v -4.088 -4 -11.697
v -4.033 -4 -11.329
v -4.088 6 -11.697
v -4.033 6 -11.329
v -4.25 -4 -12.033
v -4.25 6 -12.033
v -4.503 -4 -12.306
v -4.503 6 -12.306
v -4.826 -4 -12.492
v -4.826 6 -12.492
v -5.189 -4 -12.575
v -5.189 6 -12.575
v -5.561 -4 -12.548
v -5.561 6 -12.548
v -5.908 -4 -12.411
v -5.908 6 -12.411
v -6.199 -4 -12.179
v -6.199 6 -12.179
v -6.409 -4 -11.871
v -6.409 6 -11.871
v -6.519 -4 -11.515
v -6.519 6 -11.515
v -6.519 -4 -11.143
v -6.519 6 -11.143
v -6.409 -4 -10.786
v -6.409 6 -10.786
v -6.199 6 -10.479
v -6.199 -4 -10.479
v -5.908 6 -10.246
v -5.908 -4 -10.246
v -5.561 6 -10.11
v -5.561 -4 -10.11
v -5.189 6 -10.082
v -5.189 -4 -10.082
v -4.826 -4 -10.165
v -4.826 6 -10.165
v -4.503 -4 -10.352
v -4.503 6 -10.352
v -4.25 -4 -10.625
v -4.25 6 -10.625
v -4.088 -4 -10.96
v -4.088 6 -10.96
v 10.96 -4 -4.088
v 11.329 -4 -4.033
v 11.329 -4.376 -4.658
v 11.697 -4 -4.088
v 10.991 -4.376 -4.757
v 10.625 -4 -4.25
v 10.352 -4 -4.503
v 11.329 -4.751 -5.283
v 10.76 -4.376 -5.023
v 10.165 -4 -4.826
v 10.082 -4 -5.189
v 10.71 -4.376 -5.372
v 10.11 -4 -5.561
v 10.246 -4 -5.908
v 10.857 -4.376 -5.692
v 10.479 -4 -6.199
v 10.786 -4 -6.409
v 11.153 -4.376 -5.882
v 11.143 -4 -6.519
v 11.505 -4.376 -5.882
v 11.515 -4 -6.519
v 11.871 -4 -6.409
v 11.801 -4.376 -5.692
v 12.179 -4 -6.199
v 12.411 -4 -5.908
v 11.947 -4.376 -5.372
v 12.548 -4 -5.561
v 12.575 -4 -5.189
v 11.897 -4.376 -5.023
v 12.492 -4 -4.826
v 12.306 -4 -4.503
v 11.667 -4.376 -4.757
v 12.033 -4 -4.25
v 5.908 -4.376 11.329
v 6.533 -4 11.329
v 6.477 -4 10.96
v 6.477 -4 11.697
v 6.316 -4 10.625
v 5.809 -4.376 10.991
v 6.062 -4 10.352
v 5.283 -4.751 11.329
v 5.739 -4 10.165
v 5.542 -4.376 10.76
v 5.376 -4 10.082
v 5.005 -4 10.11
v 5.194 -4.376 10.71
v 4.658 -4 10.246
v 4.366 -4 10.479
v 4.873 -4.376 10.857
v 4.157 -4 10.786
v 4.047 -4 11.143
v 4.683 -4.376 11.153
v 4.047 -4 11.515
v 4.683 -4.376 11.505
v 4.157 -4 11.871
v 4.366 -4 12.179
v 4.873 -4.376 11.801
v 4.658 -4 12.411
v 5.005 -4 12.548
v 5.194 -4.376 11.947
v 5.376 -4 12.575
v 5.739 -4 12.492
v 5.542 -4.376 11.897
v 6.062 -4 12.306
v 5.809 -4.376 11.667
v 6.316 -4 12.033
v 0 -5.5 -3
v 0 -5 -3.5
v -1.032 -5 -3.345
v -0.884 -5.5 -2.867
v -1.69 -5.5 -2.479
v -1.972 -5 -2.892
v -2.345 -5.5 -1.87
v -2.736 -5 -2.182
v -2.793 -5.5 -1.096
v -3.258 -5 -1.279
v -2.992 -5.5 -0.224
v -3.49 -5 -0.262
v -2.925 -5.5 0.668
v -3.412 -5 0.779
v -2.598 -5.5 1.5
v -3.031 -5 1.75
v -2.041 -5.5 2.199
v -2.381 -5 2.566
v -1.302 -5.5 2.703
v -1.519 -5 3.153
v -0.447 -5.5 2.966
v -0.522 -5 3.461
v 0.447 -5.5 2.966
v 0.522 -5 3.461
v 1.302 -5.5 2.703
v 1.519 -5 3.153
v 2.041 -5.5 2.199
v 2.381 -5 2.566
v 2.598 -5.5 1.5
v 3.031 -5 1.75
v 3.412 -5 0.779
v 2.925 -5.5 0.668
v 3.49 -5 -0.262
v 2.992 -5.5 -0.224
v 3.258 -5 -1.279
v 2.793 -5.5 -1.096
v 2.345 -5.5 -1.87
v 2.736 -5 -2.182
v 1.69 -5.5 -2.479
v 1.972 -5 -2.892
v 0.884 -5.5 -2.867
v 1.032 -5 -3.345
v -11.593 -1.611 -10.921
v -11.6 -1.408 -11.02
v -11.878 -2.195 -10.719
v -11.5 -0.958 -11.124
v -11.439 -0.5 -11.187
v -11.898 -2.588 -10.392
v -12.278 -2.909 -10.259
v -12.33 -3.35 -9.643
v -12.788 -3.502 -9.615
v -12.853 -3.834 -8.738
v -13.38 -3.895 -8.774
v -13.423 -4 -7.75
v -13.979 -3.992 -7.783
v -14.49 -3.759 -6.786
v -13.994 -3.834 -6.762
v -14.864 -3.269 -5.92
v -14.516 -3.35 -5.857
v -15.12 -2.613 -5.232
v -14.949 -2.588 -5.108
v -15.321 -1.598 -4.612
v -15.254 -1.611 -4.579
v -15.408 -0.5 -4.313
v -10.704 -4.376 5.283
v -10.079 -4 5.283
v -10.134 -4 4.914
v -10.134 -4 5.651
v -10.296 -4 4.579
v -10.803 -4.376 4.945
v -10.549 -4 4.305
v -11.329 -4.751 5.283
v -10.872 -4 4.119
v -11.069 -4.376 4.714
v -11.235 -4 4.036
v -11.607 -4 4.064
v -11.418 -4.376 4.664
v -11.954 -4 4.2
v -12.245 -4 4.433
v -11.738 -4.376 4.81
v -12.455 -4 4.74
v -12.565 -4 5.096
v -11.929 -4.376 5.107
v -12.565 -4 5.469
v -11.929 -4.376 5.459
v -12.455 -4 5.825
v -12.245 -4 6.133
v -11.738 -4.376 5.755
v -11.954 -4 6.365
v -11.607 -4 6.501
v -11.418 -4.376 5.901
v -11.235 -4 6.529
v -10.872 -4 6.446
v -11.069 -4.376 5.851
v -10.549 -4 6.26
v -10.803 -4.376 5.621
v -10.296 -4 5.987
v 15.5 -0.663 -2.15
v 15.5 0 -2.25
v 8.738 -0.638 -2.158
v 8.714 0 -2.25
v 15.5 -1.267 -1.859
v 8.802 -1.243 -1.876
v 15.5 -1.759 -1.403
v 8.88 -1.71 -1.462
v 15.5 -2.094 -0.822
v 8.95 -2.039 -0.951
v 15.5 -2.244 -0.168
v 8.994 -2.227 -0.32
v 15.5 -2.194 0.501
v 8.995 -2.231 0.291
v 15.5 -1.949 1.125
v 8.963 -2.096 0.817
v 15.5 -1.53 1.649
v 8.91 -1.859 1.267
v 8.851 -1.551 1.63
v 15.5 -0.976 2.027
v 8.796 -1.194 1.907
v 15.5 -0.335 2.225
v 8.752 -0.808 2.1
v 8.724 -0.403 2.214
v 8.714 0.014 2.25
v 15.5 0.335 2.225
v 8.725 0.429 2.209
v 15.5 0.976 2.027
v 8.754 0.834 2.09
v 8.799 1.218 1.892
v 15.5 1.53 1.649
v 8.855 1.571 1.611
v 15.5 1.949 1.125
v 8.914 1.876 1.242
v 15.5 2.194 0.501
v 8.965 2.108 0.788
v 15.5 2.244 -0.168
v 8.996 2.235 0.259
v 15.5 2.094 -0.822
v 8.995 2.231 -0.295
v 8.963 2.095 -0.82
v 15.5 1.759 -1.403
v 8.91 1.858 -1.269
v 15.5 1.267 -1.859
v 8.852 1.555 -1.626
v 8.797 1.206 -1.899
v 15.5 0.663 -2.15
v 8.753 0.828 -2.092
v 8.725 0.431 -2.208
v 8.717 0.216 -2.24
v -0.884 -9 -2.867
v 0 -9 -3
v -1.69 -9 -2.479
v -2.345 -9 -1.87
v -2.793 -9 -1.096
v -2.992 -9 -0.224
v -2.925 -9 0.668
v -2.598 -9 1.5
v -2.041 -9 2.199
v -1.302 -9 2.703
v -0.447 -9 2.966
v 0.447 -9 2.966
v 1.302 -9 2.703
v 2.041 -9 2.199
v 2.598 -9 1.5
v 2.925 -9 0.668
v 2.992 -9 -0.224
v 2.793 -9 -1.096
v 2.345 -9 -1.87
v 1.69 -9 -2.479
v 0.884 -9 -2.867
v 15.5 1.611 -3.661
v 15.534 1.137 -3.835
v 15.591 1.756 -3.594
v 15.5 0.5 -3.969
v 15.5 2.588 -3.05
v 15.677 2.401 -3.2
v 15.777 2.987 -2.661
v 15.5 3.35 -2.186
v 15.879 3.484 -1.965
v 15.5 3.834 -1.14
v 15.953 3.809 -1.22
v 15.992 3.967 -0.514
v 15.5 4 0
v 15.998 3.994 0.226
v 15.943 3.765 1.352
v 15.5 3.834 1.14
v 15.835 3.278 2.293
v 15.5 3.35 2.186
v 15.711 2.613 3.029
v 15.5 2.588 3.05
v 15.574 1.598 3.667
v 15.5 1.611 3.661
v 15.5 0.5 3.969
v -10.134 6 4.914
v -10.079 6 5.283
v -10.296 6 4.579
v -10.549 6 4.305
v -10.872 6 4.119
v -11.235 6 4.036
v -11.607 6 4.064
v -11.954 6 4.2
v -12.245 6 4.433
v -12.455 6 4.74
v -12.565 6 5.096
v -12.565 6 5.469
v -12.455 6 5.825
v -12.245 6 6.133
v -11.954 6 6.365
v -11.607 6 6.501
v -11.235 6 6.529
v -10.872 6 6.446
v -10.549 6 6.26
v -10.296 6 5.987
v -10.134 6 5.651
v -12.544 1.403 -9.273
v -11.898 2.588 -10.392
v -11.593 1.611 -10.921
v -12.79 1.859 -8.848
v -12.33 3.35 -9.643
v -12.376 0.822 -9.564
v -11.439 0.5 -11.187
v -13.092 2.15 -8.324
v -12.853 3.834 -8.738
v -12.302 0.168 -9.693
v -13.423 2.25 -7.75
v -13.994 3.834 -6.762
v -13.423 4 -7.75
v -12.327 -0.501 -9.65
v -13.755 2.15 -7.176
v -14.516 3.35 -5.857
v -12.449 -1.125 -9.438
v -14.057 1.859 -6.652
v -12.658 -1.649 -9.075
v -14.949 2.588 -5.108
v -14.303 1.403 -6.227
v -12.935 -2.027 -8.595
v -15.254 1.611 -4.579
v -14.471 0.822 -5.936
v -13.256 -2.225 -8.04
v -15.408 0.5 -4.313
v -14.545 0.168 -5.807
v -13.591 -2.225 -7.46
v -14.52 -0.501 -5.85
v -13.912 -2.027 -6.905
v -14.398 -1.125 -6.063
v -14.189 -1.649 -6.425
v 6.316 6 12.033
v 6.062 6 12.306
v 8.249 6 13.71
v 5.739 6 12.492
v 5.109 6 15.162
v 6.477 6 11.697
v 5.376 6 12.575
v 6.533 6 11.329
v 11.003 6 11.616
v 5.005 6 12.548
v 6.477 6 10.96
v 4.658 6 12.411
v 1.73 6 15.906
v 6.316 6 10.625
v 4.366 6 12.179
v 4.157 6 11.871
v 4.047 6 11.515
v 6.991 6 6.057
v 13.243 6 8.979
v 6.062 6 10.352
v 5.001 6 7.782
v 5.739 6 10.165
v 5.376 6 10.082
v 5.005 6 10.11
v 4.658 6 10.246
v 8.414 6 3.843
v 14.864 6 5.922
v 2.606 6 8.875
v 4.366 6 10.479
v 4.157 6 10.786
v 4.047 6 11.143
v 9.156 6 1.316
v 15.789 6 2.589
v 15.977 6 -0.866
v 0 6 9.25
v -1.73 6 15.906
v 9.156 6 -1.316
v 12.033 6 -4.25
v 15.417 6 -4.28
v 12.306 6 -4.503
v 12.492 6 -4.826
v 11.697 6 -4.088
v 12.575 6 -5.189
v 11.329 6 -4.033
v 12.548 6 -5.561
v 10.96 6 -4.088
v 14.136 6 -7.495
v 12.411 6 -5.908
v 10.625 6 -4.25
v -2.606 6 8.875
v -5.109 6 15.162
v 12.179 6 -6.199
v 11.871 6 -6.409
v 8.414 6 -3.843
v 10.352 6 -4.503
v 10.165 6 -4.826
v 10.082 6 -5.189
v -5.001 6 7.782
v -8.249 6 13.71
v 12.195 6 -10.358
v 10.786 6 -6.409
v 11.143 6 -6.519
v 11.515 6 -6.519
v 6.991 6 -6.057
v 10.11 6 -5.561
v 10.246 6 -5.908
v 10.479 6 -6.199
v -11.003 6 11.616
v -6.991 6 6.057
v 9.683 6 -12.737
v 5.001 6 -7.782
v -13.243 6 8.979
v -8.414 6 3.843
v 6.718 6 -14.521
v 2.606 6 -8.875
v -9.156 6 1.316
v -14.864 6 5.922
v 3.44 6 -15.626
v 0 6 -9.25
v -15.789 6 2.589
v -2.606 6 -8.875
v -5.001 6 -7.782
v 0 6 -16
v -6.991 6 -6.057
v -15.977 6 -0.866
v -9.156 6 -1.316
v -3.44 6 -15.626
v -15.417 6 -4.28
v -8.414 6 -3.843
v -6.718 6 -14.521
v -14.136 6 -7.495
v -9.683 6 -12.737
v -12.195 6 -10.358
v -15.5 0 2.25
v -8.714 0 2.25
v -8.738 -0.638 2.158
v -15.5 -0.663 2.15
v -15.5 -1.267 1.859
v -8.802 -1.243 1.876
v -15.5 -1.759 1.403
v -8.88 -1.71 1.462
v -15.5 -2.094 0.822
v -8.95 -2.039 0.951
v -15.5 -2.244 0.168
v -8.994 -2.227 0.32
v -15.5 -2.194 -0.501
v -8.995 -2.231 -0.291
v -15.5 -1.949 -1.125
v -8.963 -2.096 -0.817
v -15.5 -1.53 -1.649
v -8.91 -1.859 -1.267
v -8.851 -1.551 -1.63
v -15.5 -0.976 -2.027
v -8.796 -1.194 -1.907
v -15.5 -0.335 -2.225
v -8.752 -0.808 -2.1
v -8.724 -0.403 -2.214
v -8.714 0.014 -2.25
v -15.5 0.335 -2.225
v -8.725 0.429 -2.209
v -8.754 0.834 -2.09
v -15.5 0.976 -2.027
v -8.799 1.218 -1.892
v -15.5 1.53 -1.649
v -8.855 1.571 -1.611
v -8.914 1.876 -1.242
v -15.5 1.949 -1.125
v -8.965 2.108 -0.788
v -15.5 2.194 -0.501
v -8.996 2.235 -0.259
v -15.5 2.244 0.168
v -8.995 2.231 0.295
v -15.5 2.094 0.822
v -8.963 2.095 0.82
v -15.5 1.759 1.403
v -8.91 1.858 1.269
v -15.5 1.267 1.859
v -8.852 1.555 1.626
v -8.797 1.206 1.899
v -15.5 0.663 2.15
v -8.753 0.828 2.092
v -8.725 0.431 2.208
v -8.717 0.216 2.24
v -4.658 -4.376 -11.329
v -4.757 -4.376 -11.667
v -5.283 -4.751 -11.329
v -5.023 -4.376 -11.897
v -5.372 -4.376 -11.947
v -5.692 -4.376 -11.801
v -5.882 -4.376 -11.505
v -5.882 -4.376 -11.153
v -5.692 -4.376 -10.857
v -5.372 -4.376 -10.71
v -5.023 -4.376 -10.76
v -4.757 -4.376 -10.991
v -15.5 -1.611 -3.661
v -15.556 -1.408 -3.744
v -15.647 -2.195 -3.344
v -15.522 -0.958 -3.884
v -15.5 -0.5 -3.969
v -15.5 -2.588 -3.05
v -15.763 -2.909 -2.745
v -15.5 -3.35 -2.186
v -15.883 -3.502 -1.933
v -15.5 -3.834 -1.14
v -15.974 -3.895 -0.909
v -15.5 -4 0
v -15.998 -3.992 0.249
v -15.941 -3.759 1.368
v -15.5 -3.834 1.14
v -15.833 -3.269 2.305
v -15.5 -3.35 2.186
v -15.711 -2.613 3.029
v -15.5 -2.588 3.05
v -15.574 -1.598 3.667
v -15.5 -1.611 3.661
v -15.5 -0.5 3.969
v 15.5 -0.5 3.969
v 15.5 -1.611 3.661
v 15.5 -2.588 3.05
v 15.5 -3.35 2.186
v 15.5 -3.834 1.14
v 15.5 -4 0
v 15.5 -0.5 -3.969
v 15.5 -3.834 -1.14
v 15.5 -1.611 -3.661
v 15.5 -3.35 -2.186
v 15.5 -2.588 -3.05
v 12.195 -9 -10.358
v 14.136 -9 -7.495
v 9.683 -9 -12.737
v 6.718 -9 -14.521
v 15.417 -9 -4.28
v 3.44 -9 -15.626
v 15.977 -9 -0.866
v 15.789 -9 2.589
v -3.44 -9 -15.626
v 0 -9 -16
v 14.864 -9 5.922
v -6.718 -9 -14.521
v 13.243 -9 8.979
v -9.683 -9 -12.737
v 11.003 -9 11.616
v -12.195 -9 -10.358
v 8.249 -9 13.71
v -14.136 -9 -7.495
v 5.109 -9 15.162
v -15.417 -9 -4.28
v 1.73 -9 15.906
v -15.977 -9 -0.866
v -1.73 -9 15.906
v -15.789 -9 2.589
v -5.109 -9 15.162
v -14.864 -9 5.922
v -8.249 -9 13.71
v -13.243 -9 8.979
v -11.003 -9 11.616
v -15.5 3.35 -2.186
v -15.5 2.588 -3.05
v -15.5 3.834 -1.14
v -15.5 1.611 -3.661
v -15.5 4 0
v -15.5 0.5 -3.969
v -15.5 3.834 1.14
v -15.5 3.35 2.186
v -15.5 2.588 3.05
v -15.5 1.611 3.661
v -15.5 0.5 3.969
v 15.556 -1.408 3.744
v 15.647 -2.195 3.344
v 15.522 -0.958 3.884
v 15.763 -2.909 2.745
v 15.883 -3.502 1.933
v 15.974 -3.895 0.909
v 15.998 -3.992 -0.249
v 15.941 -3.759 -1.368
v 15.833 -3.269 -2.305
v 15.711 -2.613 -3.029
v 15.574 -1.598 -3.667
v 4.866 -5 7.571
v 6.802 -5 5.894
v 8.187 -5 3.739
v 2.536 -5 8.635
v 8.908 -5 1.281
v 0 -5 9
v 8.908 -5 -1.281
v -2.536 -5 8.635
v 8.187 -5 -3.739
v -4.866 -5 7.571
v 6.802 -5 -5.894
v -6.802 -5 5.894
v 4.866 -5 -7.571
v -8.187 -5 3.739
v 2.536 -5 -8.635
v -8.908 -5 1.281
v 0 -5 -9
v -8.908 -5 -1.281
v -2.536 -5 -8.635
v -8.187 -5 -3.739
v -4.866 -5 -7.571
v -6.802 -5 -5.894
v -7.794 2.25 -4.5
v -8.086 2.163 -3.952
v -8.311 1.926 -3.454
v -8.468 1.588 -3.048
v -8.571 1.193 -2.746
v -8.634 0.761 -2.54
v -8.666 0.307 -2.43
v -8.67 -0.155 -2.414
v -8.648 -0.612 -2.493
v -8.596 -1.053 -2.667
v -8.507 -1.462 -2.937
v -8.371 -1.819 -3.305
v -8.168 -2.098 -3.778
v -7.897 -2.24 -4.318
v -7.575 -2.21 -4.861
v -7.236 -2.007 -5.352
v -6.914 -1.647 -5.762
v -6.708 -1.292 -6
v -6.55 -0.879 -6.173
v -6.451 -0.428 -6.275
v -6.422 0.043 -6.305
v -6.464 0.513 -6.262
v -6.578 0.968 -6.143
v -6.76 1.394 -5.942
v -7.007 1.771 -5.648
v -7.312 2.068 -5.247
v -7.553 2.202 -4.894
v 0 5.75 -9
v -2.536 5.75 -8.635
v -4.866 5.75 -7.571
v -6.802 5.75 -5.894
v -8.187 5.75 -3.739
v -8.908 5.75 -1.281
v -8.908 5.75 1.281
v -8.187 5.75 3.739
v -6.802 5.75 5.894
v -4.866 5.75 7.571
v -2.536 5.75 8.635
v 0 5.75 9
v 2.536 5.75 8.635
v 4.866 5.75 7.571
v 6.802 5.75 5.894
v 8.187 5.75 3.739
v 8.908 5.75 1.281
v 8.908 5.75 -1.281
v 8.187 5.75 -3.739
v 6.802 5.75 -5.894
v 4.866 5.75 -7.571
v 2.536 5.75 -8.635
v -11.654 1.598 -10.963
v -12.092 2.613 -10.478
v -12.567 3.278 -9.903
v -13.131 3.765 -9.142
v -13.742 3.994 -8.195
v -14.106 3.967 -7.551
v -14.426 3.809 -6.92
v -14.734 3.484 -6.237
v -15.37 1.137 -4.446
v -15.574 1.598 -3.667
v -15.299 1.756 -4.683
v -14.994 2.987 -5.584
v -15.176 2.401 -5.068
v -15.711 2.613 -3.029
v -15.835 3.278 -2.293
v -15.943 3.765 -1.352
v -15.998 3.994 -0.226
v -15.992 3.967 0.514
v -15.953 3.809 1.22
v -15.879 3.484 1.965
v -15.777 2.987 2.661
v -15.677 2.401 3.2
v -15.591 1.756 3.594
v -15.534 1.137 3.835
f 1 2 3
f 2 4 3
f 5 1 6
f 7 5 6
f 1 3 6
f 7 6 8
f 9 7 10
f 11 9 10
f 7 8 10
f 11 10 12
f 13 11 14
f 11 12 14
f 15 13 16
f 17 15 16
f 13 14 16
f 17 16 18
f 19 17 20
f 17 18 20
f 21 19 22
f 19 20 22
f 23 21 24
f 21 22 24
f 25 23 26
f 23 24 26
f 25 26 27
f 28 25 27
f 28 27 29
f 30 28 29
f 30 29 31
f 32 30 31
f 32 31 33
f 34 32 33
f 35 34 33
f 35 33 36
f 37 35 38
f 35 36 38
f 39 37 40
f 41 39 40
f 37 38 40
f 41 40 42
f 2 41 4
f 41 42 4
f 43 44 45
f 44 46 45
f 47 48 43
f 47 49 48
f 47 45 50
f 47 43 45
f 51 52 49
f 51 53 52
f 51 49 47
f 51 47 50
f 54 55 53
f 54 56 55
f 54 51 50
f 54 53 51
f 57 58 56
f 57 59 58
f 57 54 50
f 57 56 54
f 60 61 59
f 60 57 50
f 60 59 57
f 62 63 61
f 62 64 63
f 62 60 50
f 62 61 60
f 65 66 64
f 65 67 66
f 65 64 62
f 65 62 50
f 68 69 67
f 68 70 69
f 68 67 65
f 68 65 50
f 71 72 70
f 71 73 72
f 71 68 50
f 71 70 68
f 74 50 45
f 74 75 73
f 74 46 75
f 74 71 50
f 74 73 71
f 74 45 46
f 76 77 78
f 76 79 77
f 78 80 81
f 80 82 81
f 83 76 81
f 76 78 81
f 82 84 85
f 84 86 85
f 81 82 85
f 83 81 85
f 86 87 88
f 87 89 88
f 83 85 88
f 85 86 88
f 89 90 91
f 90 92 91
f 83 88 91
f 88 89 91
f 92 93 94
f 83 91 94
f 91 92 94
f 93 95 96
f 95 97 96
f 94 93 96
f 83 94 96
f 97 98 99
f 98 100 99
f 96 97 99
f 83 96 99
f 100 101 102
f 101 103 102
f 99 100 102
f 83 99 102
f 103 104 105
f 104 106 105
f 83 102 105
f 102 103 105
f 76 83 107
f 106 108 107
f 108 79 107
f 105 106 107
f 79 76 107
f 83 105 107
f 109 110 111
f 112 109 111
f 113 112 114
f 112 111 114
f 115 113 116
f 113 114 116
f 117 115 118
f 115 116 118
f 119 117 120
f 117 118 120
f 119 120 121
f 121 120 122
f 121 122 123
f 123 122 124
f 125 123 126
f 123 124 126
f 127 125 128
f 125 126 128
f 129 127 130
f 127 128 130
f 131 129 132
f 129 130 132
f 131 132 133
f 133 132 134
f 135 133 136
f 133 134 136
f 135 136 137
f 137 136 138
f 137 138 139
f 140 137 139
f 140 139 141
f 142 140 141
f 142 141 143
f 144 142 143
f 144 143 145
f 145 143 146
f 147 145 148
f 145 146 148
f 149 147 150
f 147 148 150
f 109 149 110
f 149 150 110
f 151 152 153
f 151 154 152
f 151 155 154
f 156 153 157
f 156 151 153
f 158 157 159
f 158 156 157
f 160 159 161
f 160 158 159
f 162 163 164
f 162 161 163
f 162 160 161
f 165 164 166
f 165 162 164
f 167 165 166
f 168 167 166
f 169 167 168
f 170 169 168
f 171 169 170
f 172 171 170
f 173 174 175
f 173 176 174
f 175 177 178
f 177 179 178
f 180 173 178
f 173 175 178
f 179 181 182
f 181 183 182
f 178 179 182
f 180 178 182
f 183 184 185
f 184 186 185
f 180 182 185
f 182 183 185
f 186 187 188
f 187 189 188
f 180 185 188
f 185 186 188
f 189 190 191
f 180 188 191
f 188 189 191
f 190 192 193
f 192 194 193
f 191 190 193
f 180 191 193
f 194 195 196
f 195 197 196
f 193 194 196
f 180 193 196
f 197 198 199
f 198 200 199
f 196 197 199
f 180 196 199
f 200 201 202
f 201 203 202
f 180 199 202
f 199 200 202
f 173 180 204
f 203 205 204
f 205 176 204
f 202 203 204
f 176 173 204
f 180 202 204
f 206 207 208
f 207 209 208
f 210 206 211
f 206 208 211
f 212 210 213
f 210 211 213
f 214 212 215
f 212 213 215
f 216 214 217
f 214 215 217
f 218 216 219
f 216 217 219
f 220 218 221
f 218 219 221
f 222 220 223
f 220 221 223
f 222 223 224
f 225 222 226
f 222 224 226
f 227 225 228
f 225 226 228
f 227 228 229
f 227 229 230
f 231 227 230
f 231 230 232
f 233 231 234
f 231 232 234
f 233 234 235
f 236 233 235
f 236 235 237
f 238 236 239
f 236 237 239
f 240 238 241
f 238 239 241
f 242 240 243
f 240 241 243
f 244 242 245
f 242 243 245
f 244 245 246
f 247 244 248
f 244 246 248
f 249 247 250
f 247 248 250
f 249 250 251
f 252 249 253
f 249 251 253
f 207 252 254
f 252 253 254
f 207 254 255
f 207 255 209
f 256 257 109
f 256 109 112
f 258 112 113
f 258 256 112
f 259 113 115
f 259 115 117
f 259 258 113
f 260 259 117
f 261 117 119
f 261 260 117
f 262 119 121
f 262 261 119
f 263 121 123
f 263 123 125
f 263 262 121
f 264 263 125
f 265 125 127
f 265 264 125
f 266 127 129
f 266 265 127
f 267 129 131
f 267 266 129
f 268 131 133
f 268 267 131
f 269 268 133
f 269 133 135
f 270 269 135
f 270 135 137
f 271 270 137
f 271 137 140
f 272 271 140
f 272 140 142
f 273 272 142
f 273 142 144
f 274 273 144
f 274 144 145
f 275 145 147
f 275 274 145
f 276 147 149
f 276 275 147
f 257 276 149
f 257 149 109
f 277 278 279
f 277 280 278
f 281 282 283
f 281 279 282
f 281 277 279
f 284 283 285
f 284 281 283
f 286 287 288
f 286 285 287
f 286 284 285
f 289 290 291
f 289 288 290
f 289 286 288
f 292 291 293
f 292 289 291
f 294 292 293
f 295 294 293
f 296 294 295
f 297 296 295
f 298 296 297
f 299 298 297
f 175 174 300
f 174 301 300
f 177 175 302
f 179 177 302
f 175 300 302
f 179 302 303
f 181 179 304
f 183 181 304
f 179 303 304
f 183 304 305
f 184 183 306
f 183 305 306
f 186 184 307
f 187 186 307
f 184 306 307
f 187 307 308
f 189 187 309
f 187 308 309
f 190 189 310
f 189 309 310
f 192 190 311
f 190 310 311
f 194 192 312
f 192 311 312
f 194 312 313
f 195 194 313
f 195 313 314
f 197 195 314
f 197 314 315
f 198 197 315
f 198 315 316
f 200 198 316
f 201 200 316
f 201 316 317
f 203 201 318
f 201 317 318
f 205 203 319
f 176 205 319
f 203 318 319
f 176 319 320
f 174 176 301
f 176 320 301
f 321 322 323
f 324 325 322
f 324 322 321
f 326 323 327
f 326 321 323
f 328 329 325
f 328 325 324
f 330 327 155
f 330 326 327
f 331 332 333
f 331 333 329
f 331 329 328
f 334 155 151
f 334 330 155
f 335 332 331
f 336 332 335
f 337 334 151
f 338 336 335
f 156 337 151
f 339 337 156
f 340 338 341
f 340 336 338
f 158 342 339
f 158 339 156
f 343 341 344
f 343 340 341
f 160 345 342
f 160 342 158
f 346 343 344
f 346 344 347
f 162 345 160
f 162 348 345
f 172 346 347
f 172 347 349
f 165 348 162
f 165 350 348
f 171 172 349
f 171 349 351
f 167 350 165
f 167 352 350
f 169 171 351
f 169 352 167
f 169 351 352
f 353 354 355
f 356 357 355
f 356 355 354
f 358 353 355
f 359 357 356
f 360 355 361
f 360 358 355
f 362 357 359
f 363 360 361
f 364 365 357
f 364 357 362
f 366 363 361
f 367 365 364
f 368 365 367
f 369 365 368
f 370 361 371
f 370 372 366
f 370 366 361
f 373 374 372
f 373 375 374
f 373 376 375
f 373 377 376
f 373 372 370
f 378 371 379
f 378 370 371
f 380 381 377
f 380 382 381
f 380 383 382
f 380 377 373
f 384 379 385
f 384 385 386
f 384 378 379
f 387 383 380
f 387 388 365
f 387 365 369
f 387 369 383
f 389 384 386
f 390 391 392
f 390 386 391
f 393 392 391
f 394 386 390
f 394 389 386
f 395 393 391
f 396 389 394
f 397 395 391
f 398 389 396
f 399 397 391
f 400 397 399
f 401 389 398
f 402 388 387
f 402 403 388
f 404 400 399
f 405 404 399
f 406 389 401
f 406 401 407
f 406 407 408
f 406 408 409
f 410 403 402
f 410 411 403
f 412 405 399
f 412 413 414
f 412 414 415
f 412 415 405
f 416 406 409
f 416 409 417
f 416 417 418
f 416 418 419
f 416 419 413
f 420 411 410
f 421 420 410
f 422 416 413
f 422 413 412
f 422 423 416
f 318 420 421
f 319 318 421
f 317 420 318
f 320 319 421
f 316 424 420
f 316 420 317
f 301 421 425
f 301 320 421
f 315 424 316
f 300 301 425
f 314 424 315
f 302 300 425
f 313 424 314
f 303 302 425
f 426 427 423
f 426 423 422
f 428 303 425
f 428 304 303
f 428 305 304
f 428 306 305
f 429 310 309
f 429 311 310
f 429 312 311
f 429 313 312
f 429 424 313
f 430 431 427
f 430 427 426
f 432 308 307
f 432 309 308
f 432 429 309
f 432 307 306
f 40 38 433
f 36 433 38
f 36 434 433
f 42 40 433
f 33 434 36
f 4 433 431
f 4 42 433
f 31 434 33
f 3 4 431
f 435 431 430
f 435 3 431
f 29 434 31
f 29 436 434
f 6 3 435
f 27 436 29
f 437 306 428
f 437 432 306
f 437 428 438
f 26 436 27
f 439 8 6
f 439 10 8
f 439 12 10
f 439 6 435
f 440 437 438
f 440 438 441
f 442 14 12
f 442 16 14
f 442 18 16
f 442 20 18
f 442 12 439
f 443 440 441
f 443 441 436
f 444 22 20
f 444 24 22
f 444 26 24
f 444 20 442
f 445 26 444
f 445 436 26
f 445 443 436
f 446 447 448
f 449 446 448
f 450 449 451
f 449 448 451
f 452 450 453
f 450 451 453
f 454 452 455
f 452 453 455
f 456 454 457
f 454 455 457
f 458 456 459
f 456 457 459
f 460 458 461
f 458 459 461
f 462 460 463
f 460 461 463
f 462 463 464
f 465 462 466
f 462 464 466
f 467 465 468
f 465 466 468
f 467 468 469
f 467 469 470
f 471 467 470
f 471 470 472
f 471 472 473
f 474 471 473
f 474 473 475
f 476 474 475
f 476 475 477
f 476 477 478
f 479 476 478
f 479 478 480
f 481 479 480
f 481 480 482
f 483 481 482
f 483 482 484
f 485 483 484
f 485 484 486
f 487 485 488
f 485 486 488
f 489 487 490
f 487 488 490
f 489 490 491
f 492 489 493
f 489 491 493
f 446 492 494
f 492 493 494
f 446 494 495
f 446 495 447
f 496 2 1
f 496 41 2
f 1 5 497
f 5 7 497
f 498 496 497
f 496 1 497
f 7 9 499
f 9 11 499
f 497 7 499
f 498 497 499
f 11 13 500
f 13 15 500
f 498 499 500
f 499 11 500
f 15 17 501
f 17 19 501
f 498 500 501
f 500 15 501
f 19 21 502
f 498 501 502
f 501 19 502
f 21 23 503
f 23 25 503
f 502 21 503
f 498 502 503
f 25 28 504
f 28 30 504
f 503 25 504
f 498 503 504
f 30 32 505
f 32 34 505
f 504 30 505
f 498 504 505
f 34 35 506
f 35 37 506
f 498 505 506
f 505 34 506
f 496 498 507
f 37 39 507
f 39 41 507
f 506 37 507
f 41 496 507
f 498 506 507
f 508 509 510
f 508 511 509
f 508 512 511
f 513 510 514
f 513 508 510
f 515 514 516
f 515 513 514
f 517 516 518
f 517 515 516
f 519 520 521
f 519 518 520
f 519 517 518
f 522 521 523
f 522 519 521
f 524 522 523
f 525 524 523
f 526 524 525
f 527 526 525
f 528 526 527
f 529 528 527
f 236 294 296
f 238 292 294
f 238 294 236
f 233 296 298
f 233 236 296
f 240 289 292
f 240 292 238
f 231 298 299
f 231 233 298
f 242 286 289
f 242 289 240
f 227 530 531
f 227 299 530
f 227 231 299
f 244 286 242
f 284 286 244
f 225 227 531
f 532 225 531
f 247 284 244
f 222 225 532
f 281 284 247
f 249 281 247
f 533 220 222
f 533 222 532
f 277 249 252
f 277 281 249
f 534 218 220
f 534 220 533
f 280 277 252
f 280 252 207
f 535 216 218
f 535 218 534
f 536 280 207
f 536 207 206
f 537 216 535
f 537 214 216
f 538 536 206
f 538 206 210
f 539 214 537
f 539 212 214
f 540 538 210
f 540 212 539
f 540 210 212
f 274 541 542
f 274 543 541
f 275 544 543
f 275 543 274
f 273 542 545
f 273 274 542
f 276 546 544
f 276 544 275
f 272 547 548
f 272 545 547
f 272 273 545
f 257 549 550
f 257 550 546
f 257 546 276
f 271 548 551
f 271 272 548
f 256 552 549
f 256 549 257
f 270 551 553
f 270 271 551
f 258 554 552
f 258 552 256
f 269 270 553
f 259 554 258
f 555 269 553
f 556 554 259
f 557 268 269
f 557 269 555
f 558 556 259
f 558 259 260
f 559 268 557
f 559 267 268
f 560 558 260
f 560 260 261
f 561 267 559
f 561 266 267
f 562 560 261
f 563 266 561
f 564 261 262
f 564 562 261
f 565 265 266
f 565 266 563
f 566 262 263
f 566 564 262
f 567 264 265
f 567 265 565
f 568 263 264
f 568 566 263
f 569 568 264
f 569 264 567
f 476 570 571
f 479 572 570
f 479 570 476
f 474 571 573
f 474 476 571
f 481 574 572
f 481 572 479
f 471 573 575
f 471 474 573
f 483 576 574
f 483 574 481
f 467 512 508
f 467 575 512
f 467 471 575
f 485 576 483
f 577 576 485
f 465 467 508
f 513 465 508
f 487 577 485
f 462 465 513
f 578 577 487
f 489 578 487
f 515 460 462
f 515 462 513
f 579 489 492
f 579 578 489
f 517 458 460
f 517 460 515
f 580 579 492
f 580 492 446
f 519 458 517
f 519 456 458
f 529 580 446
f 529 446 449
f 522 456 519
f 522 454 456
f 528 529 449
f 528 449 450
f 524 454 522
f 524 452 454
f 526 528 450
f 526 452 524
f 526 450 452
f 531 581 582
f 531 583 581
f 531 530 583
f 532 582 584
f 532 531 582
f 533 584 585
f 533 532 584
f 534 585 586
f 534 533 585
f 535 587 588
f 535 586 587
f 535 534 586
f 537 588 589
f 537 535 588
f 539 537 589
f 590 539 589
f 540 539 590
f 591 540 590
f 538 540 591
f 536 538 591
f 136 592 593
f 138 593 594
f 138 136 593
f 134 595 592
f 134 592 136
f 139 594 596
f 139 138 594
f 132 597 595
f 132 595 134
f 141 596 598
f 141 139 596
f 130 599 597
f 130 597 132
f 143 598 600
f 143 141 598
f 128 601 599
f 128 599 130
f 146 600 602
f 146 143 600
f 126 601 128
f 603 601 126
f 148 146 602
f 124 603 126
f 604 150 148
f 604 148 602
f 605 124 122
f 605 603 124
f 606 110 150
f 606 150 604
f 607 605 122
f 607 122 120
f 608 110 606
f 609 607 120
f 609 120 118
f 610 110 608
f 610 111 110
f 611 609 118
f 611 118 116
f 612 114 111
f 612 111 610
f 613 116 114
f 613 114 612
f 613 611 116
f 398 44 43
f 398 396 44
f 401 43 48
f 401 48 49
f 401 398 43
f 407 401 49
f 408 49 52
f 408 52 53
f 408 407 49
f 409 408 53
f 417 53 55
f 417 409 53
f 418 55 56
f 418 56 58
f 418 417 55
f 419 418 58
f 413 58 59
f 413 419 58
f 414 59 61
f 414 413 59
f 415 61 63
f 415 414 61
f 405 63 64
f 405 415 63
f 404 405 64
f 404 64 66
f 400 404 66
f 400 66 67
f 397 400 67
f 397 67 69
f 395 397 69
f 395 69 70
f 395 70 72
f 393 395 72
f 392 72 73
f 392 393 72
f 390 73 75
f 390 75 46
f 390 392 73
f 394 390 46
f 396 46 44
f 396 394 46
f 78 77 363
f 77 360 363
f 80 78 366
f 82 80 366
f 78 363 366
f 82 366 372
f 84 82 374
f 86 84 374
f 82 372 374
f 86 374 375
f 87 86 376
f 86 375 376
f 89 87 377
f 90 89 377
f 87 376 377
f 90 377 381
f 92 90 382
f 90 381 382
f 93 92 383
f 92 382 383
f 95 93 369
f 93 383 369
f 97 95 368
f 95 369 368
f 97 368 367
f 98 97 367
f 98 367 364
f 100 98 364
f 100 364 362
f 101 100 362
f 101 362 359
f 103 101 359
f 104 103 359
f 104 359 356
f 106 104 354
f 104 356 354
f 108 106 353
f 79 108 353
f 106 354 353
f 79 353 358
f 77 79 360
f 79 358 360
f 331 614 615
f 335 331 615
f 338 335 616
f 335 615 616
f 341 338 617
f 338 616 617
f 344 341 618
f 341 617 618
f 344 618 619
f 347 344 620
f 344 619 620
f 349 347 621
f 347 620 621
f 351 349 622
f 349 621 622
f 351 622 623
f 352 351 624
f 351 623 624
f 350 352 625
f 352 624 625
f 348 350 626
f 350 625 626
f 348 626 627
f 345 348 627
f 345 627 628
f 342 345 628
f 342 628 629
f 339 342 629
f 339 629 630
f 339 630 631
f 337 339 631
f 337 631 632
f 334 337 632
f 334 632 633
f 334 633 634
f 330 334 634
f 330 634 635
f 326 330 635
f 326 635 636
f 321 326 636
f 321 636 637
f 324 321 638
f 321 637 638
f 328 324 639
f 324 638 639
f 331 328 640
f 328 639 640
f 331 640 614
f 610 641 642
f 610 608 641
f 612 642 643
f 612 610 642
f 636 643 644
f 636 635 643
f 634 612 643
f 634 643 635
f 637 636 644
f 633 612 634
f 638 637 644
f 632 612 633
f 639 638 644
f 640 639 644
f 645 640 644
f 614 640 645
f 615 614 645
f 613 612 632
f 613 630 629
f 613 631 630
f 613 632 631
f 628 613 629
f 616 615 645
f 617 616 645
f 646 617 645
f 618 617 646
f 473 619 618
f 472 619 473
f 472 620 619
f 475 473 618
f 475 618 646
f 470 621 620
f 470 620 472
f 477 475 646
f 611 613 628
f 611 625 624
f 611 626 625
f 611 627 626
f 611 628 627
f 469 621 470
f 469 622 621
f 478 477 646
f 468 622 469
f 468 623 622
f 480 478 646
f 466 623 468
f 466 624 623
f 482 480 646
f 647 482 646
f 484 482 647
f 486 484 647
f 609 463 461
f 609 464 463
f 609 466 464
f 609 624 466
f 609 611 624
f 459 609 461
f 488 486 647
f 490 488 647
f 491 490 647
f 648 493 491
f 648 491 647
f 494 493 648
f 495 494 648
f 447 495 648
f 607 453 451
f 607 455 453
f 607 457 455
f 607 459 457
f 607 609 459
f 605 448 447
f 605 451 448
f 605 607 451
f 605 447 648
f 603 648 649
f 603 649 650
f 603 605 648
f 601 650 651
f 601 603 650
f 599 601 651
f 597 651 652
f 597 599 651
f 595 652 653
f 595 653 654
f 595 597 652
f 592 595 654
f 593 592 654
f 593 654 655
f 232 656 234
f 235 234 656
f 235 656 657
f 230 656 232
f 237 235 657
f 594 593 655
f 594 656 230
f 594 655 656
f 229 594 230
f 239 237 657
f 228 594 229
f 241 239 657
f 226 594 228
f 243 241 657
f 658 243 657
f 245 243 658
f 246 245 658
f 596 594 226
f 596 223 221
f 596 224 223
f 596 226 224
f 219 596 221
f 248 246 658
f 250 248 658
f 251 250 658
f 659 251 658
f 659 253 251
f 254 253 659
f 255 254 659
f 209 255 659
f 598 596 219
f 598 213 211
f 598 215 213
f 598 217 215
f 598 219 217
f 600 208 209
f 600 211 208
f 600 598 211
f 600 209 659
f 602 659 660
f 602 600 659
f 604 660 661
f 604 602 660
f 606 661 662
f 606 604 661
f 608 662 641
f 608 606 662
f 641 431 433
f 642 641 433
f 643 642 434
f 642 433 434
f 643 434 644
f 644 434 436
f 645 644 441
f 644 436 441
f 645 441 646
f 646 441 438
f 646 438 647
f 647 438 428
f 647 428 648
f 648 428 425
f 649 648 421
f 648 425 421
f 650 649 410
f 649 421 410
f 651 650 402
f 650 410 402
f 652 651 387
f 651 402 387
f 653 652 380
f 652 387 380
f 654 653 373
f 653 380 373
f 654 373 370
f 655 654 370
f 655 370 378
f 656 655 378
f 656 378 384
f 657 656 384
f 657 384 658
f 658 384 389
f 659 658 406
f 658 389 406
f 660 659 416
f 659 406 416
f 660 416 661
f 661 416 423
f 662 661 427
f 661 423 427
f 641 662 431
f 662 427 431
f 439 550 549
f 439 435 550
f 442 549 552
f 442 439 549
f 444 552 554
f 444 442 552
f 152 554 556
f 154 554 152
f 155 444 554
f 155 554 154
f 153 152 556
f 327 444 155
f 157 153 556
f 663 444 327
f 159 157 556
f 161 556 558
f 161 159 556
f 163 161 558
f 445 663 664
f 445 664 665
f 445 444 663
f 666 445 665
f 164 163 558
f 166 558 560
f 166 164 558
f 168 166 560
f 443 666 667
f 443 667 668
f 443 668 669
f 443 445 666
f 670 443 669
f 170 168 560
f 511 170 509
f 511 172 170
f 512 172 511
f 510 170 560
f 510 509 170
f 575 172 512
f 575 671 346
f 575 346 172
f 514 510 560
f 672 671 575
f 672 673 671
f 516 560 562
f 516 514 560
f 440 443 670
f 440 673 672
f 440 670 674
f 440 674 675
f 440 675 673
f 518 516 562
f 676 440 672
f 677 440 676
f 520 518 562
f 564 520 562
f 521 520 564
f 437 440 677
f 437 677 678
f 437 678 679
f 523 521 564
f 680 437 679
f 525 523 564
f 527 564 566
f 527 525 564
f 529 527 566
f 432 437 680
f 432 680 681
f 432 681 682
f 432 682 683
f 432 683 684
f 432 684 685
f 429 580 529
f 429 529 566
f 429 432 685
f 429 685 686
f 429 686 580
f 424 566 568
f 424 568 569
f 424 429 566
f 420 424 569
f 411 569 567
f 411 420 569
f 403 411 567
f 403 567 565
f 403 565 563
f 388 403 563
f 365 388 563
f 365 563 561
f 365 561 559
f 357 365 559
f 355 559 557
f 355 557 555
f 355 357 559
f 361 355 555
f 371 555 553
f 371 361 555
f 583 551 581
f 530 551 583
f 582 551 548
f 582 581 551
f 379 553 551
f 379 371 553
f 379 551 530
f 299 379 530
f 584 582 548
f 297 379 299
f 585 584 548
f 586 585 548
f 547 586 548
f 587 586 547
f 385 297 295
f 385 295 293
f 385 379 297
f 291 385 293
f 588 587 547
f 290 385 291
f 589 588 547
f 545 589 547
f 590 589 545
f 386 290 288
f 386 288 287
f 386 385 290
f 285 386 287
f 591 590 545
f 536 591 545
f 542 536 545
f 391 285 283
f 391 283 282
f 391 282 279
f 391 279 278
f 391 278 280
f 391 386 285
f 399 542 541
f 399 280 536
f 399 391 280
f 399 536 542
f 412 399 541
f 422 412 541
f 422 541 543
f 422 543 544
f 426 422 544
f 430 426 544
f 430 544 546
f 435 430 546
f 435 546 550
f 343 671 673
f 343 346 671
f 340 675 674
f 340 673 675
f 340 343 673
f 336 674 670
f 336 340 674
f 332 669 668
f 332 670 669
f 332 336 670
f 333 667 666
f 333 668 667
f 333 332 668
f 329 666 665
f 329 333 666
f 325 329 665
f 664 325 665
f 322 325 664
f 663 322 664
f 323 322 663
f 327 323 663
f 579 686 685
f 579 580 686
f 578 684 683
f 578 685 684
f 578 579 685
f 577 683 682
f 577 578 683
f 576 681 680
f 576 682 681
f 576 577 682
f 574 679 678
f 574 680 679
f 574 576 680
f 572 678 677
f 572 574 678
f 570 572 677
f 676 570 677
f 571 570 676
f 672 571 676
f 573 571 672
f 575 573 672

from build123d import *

# Parameters (mm, degrees)
ESBO_O4_W                        = 2.25
ESBO_O4_H                        = 16
F_4_5_4_5_DIAMETER_HOLE2_D       = 4.5
F_4_5_4_5_DIAMETER_HOLE2_DEPTH   = 18
F_4_5_4_5_DIAMETER_HOLE2_TIP     = 1.351936393
ESBO_O12_R                       = 16
ESBO_O12_R_2                     = 9
RESSALTO_EXTRUS_O1_DEPTH         = 1
CHANFRO1_SIZE                    = 0.5
CHANFRO2_SIZE                    = 0.25
FURO_DE_DI_METRO_4_5_4_5_2_D     = 4.5
FURO_DE_DI_METRO_4_5_4_5_2_DEPTH = 8
FURO_DE_DI_METRO_4_5_4_5_2_TIP   = 1.351936393
CORTE_EXTRUS_O4_START            = -0.5
ESBO_O18_R                       = 4
ESBO_O18_R_2                     = 2.25
CORTE_EXTRUS_O4_DEPTH            = 0.5
PADR_OCIRCULAR6_COUNT            = 2
PADR_OCIRCULAR6_ANGLE            = 30
PADR_OCIRCULAR7_COUNT            = 2
PADR_OCIRCULAR7_ANGLE            = 210


# Read off the part's stored shape, not the designer's step: PadrãoCircular5
with BuildPart() as part:
    # Esboço1 → Revolução1 (revolve)
    with BuildSketch(Plane.XY, mode=Mode.PRIVATE) as revolu_o1_sk:
        Polygon((3, -9), (16, -9), (16, 5), (9, 5), (9, -5), (3, -5), align=None)
    revolve(revolu_o1_sk.sketch.rotate(Axis((0, -9, 0), (0, 1, 0)), 90), axis=Axis((0, -9, 0), (0, 1, 0)))

    # Esboço4 → Furo de diâmetro Ø4.5 (4.5)1 (revolve, cut)
    with BuildSketch(Plane(origin=(16, 0, 0), x_dir=(0, 0, -1), z_dir=(0, 1, 0))):
        with Locations((1.125, 8)):
            Rectangle(ESBO_O4_W, ESBO_O4_H)
    revolve(axis=Axis((22.35, 0, 0), (-1, 0, 0)), mode=Mode.SUBTRACT)

    # Ø4.5 (4.5) Diameter Hole2
    with Locations(Plane(origin=(-13.856406461, 0, -8), x_dir=(0, -1, 0), z_dir=(-0.8660254037844364, 0, -0.5000000000000041))):
        with Locations((0, 0)):
            Hole(F_4_5_4_5_DIAMETER_HOLE2_D / 2, depth=F_4_5_4_5_DIAMETER_HOLE2_DEPTH)
            with Locations((0, 0, -(F_4_5_4_5_DIAMETER_HOLE2_DEPTH + F_4_5_4_5_DIAMETER_HOLE2_TIP / 2))):  # 118° drill point
                Cone(0, F_4_5_4_5_DIAMETER_HOLE2_D / 2, F_4_5_4_5_DIAMETER_HOLE2_TIP, mode=Mode.SUBTRACT)

    # Esboço12 → Ressalto-extrusão1 (add)
    with BuildSketch(Plane(origin=(0, 5, 0), x_dir=(1, 0, 0), z_dir=(0, 1, 0))):
        with Locations(Location((0, 0, 0), (0, 0, 90))):
            Circle(ESBO_O12_R)
        with Locations(Location((0, 0, 0), (0, 0, 90))):
            Circle(ESBO_O12_R_2, mode=Mode.SUBTRACT)
    extrude(amount=RESSALTO_EXTRUS_O1_DEPTH)

    # Esboço13 → Furo roscado de M3x0.51 (revolve, cut)
    with BuildSketch(Plane(origin=(11.328847338, 6, -5.282728272), x_dir=(0, 0, 1), z_dir=(1, 0, 0))):
        Polygon((0, 0), (0, 10.751075774), (1.25, 10), (1.25, 0), align=None)
    revolve(axis=Axis((11.328847338, 12.35, -5.282728272), (0, -1, 0)), mode=Mode.SUBTRACT)

    # PadrãoCircular5 outline → PadrãoCircular5 (revolve, cut)
    with BuildSketch(Plane(origin=(5.282728272, 0, 11.328847338), x_dir=(1, 0, 0), z_dir=(0, 0, 1))):
        Polygon((0, 6), (0, -4.751075774), (1.25, -4), (1.25, 6), align=None)
    revolve(axis=Axis((5.282728272, 0, 11.328847338), (0, 1, 0)), mode=Mode.SUBTRACT)

    # Padr_oCircular5 2 outline → Padr_oCircular5 2 (revolve, cut)
    with BuildSketch(Plane(origin=(-11.328847338, 0, 5.282728272), x_dir=(1, 0, 0), z_dir=(0, 0, 1))):
        Polygon((0, 6), (0, -4.751075774), (1.25, -4), (1.25, 6), align=None)
    revolve(axis=Axis((-11.328847338, 0, 5.282728272), (0, 1, 0)), mode=Mode.SUBTRACT)

    # Padr_oCircular5 3 outline → Padr_oCircular5 3 (revolve, cut)
    with BuildSketch(Plane(origin=(-5.282728272, 0, -11.328847338), x_dir=(1, 0, 0), z_dir=(0, 0, 1))):
        Polygon((0, 6), (0, -4.751075774), (1.25, -4), (1.25, 6), align=None)
    revolve(axis=Axis((-5.282728272, 0, -11.328847338), (0, 1, 0)), mode=Mode.SUBTRACT)

    # Chanfro1
    chanfro1_edges = [part.edges().sort_by_distance(p)[0] for p in [
        (0, -5, 3),
    ]]
    chamfer(chanfro1_edges, length=CHANFRO1_SIZE)

    # Chanfro2
    chanfro2_edges = [part.edges().sort_by_distance(p)[0] for p in [
        (0, 6, 9),
    ]]
    chamfer(chanfro2_edges, length=CHANFRO2_SIZE)

    # Furo de diâmetro Ø4.5 (4.5)2
    with Locations(Plane(origin=(-16, 0, 0), x_dir=(0, 0, -1), z_dir=(-1, 0, 0))):
        with Locations((0, 0)):
            Hole(FURO_DE_DI_METRO_4_5_4_5_2_D / 2, depth=FURO_DE_DI_METRO_4_5_4_5_2_DEPTH)
            with Locations((0, 0, -(FURO_DE_DI_METRO_4_5_4_5_2_DEPTH + FURO_DE_DI_METRO_4_5_4_5_2_TIP / 2))):  # 118° drill point
                Cone(0, FURO_DE_DI_METRO_4_5_4_5_2_D / 2, FURO_DE_DI_METRO_4_5_4_5_2_TIP, mode=Mode.SUBTRACT)

    # Esboço18 → Corte-extrusão4 (cut)
    with BuildSketch(Plane(origin=(-13.856406461, 0, -8), x_dir=(0, -1, 0), z_dir=(-0.8660254037844364, 0, -0.5000000000000041)).offset(CORTE_EXTRUS_O4_START)):
        Circle(ESBO_O18_R)
        with Locations(Location((0, 0, 0), (0, 0, 90))):
            Circle(ESBO_O18_R_2, mode=Mode.SUBTRACT)
    corte_extrus_o4 = extrude(amount=CORTE_EXTRUS_O4_DEPTH, mode=Mode.SUBTRACT)

    # PadrãoCircular6: Corte-extrusão4 ×2 about axis
    padr_ocircular6_axis = Axis((0, -9.75, 0), (0, 1, 0))
    for i in range(1, PADR_OCIRCULAR6_COUNT):
        add(corte_extrus_o4.rotate(padr_ocircular6_axis, i * PADR_OCIRCULAR6_ANGLE / (PADR_OCIRCULAR6_COUNT - 1)), mode=Mode.SUBTRACT)

    # PadrãoCircular7: Corte-extrusão4 ×2 about axis
    padr_ocircular7_axis = Axis((0, -9.75, 0), (0, 1, 0))
    for i in range(1, PADR_OCIRCULAR7_COUNT):
        add(corte_extrus_o4.rotate(padr_ocircular7_axis, i * PADR_OCIRCULAR7_ANGLE / (PADR_OCIRCULAR7_COUNT - 1)), mode=Mode.SUBTRACT)


solid = part.part
